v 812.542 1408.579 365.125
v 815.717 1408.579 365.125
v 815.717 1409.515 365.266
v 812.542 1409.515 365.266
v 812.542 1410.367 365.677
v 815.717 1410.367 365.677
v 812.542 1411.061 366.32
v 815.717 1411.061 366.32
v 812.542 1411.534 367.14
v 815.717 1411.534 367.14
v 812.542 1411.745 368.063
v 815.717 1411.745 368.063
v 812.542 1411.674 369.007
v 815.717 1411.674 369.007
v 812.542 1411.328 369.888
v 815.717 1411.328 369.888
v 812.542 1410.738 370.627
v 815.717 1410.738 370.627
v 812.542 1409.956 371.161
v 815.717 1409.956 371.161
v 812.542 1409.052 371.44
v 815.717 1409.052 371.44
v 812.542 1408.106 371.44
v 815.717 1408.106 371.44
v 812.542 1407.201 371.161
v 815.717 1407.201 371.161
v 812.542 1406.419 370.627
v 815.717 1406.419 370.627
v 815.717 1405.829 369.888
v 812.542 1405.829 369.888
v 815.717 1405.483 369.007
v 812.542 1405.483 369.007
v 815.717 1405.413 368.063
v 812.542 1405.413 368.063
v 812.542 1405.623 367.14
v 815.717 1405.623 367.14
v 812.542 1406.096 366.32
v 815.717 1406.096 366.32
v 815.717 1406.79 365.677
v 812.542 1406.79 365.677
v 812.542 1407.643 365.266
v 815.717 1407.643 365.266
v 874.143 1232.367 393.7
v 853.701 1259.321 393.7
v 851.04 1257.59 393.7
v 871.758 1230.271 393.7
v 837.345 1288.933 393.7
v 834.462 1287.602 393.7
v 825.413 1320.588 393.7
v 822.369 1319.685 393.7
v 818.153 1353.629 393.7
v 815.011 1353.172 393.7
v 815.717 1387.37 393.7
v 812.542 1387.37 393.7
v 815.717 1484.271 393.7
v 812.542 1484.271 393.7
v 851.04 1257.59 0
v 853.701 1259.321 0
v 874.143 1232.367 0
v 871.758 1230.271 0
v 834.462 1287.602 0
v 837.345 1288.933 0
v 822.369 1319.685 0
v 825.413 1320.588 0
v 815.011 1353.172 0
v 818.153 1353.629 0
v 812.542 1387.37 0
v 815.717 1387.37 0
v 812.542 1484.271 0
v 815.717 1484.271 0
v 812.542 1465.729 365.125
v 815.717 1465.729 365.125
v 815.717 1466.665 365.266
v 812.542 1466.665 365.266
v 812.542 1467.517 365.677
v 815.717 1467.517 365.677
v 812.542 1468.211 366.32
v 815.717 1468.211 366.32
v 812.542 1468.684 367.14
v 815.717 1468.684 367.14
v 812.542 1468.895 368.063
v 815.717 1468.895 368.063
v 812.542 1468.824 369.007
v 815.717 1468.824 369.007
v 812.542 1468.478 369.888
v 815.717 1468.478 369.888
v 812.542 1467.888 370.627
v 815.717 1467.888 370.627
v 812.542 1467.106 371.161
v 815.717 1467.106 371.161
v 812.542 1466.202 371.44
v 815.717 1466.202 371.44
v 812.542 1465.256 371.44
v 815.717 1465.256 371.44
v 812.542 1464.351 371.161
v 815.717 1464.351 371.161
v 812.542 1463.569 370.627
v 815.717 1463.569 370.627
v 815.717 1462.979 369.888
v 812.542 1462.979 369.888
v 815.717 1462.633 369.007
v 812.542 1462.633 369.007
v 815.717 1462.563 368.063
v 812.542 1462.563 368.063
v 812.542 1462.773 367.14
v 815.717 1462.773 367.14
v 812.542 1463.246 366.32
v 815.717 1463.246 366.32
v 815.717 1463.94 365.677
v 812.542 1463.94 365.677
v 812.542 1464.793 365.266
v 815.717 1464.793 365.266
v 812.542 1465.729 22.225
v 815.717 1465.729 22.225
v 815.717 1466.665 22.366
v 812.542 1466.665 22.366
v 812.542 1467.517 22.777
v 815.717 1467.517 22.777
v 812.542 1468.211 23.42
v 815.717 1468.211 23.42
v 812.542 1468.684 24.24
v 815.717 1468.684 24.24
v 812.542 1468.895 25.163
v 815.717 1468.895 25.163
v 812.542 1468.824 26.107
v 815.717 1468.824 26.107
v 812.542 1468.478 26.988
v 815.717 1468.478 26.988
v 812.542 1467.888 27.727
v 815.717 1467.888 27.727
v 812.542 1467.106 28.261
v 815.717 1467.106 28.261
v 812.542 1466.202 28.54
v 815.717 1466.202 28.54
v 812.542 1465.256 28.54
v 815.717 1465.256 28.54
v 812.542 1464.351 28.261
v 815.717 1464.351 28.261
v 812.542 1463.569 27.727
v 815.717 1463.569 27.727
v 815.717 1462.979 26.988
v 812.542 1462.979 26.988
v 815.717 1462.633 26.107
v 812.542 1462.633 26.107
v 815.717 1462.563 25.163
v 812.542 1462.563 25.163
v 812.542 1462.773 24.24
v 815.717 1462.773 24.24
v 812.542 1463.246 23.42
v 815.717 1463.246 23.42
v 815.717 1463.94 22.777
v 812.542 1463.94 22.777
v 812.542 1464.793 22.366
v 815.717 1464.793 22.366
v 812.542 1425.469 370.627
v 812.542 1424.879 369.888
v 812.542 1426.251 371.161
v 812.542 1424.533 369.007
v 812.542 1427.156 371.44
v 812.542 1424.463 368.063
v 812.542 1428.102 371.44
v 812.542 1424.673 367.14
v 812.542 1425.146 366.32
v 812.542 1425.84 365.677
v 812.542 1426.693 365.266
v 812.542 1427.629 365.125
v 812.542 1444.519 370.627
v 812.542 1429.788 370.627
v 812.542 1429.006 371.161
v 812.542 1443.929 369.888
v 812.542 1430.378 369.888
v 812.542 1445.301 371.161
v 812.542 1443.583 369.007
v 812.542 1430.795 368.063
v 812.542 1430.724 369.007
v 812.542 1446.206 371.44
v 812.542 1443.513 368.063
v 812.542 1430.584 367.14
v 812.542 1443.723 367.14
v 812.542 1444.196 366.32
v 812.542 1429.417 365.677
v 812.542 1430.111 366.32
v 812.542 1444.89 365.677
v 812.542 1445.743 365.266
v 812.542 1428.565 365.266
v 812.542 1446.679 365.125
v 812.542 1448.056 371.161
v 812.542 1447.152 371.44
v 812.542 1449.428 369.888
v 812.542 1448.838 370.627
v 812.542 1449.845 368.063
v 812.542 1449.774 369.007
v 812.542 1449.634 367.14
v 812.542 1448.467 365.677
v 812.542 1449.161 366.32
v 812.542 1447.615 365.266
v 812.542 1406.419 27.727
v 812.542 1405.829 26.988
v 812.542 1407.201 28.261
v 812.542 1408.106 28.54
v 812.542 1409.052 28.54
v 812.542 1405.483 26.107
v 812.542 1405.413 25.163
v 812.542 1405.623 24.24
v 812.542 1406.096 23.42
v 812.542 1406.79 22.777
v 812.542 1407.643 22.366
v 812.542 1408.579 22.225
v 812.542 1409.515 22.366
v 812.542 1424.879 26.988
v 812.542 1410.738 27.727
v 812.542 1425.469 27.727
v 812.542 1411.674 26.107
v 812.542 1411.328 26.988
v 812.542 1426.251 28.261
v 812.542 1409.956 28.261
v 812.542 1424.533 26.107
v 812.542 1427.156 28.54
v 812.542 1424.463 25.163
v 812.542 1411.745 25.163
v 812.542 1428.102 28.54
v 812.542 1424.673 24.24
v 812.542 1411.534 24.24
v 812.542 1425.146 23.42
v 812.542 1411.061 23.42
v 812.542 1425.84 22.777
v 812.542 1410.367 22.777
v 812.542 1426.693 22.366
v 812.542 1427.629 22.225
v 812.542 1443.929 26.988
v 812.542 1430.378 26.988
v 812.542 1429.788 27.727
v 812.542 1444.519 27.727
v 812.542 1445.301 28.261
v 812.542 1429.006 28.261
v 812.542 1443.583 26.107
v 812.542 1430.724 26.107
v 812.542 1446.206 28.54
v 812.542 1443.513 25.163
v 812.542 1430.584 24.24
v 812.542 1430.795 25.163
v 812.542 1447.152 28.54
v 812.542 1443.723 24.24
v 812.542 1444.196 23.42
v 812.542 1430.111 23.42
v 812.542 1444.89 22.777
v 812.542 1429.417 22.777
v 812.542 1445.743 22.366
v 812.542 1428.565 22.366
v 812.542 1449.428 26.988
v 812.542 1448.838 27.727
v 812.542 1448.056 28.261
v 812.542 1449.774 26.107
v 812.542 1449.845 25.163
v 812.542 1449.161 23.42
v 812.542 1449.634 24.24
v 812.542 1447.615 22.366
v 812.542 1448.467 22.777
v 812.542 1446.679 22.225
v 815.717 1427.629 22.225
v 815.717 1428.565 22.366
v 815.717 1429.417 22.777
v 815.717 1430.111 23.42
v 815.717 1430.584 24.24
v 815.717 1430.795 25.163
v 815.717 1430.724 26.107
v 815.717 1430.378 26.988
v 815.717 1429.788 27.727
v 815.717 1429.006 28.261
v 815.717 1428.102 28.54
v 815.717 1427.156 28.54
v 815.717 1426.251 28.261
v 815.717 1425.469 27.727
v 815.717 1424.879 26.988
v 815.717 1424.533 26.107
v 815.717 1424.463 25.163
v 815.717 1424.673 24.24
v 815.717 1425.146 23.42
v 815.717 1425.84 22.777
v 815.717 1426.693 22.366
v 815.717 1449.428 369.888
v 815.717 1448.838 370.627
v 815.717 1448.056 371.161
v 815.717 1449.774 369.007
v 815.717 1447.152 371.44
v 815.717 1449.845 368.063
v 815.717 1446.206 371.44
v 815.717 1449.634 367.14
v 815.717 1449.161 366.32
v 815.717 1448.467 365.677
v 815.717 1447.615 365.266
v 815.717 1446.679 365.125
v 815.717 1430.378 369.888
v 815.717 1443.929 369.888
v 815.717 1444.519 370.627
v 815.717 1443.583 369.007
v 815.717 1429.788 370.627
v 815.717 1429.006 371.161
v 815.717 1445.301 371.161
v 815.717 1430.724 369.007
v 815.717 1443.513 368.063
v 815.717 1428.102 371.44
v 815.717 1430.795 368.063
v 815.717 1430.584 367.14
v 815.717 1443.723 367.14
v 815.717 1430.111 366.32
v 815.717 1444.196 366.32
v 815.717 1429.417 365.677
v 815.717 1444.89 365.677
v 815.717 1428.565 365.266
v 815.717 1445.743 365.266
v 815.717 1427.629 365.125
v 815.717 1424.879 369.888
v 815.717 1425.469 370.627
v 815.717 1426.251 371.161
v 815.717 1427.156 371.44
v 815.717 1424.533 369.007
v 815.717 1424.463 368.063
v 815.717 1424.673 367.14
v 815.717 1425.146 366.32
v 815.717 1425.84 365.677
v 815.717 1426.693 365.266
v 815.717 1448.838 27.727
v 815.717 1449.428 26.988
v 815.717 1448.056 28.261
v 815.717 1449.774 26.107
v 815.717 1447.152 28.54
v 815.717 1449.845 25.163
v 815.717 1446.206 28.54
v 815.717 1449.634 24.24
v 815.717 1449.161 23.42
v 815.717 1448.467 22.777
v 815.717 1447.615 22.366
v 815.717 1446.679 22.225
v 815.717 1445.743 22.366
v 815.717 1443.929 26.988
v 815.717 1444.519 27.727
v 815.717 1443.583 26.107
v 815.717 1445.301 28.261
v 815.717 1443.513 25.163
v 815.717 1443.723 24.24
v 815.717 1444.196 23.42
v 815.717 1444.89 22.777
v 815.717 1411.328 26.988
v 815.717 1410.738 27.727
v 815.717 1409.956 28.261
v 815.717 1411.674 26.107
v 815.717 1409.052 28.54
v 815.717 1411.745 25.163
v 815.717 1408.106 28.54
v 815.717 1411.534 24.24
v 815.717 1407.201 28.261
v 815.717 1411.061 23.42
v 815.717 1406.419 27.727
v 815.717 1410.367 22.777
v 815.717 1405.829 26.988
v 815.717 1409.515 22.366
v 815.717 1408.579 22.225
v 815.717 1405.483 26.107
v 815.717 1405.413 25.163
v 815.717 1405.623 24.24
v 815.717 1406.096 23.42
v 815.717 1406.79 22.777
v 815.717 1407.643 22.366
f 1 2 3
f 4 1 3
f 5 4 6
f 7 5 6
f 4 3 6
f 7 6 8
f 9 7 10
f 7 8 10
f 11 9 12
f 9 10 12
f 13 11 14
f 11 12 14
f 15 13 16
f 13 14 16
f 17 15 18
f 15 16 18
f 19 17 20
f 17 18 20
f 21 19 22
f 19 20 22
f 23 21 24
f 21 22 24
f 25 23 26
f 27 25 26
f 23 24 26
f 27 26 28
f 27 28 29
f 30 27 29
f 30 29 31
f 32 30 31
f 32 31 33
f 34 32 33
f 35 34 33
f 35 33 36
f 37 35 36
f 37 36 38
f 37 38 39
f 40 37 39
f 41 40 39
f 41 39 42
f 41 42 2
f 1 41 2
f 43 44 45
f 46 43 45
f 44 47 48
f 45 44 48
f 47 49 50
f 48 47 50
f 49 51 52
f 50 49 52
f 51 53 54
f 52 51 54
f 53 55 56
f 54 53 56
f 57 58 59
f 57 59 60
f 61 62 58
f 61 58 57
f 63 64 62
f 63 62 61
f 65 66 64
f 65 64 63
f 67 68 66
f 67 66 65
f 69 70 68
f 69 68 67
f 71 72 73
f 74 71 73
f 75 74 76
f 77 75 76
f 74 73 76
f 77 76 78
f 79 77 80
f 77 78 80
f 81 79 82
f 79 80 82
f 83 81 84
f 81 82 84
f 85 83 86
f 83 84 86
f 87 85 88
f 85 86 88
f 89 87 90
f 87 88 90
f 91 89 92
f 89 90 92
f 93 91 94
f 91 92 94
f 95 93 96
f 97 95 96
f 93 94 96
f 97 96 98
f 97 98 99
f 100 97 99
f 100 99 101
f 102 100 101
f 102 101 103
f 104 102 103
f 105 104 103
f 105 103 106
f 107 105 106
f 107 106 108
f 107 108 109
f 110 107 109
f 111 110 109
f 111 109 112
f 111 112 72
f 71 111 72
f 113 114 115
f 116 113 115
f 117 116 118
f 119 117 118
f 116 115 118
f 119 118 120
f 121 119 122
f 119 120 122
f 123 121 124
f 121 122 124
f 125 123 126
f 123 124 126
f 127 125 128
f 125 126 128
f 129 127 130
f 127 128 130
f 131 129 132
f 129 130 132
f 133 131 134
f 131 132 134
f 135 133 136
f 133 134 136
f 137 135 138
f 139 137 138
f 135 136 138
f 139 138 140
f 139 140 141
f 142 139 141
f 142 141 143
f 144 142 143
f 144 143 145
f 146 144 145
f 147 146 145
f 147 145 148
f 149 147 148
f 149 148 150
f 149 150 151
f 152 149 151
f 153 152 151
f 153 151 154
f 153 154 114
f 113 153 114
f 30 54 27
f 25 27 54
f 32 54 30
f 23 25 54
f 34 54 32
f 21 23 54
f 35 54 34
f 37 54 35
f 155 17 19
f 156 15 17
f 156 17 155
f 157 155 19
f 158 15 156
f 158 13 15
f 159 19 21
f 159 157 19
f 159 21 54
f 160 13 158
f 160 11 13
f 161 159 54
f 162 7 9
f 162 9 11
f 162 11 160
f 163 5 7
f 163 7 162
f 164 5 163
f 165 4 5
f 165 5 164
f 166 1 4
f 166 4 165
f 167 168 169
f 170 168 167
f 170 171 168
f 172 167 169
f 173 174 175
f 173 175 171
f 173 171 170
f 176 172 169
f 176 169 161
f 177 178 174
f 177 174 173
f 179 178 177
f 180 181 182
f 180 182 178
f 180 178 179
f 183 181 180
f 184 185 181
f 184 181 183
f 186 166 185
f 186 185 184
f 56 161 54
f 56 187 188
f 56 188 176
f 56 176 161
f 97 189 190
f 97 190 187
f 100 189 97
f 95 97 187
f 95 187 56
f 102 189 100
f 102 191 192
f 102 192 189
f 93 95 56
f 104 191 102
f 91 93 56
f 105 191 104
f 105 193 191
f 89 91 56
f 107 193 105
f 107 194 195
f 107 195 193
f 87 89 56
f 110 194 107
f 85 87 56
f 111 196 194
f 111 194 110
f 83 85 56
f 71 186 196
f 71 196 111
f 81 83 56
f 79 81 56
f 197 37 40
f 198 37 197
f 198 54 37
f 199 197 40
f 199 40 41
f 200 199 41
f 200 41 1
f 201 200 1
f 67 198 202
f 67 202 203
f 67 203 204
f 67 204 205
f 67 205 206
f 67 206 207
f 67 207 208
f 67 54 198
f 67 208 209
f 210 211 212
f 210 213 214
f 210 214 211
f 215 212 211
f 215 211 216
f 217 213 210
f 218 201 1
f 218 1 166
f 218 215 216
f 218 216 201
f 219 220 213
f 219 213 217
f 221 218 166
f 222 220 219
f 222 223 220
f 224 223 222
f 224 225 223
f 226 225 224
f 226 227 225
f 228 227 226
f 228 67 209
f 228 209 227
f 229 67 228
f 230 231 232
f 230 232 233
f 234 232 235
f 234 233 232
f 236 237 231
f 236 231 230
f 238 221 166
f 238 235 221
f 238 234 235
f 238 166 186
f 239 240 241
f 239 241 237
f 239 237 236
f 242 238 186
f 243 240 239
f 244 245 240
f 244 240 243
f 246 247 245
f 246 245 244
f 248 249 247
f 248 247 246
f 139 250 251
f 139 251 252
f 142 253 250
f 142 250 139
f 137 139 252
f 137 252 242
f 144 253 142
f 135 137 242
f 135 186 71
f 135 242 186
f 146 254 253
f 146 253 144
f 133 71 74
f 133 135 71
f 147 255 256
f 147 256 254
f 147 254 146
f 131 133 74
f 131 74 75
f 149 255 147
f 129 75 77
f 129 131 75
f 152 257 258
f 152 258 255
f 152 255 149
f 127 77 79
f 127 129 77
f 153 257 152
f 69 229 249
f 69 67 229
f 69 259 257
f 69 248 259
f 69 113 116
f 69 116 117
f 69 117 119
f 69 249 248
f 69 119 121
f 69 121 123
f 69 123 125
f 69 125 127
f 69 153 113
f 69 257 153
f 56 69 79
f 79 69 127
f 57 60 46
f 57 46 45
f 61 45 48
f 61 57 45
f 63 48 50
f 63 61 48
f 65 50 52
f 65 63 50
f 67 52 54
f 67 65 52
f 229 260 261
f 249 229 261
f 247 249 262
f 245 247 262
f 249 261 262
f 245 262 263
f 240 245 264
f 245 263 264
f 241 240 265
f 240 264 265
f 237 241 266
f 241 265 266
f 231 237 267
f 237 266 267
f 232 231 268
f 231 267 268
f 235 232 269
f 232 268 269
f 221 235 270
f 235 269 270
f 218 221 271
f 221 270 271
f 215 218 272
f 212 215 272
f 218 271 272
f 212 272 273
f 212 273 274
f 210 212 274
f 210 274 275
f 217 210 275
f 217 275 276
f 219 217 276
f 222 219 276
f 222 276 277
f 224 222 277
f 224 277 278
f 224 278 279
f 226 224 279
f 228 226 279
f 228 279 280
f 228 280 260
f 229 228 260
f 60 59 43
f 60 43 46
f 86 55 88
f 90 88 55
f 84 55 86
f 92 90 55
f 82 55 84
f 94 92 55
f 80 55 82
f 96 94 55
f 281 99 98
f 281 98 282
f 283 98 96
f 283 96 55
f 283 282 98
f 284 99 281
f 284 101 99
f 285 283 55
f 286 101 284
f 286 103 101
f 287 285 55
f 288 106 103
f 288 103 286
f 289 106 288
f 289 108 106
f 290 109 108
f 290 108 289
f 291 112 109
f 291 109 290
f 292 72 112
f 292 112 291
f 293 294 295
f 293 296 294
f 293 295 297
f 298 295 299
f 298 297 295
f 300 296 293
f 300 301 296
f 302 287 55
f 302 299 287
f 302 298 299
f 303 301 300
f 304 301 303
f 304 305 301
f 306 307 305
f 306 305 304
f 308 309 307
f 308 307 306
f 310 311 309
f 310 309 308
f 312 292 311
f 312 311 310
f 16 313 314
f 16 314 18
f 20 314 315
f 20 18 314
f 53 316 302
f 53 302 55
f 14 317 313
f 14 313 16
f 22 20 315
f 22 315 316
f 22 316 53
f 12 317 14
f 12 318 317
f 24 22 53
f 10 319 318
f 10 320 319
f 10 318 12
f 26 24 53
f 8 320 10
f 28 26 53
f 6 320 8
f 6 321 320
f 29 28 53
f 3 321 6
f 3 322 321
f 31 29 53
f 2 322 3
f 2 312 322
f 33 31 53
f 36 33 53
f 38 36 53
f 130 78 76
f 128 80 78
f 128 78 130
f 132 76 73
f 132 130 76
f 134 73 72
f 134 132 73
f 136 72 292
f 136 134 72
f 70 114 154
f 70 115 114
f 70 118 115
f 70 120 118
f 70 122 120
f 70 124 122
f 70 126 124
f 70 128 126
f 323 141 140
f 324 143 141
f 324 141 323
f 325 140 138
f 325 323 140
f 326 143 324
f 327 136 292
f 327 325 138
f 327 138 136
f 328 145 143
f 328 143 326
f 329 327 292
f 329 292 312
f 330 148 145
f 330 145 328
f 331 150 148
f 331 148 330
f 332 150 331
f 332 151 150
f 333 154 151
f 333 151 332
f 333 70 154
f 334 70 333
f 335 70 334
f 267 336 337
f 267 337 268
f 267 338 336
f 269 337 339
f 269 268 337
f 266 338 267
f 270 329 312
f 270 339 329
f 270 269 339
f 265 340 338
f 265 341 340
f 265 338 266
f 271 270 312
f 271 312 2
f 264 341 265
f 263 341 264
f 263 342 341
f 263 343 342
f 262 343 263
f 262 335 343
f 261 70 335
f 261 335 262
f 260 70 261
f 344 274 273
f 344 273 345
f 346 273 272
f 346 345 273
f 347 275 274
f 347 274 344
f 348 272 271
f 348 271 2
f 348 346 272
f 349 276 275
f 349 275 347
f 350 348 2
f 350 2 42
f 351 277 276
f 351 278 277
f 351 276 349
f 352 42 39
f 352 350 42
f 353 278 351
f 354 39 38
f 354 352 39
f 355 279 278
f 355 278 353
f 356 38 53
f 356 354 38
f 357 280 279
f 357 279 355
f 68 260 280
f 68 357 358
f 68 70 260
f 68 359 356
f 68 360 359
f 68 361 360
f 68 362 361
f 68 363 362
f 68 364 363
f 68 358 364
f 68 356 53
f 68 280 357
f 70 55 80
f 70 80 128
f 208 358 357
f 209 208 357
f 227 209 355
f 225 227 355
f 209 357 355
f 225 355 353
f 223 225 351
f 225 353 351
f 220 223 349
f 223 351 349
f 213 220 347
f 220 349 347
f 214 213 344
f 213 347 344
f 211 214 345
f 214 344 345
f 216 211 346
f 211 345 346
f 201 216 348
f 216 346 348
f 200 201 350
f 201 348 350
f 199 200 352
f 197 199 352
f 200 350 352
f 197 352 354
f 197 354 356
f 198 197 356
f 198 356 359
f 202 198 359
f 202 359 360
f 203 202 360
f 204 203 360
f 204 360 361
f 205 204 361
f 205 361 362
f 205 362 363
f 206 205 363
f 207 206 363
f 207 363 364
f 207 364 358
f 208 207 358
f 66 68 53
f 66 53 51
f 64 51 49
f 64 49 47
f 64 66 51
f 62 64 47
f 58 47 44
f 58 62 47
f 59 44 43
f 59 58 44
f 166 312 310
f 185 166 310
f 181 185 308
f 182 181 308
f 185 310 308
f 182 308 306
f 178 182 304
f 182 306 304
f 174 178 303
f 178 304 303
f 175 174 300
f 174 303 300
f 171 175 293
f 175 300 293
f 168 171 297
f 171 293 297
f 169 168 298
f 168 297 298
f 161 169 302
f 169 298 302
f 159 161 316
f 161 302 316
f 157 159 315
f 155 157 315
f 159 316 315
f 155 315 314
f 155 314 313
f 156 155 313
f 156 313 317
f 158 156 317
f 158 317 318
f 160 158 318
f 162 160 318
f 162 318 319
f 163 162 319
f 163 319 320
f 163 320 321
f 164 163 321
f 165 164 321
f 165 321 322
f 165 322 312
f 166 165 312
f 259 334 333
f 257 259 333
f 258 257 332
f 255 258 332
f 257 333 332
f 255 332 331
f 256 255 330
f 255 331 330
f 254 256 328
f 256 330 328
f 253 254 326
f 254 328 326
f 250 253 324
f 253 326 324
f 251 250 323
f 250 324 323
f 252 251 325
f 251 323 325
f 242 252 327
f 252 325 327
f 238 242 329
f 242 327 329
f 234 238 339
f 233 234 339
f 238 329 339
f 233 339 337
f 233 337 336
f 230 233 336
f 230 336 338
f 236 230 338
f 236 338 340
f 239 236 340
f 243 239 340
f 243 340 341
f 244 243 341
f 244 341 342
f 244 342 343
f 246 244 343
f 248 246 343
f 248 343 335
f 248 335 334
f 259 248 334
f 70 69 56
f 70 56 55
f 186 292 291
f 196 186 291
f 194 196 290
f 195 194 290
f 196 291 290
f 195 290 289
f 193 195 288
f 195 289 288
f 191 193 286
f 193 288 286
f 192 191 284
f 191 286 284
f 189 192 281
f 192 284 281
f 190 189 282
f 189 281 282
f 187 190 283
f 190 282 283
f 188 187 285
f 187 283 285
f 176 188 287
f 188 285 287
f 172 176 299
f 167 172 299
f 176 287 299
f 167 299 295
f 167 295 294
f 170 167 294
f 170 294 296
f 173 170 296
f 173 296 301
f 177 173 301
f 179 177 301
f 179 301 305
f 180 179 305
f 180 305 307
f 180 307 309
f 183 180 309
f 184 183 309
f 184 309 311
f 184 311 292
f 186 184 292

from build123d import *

# Parameters (mm, degrees)
BOSS_EXTRUDE1_DEPTH = 393.7
SKETCH2_R           = 3.175
CUT_EXTRUDE1_DEPTH  = 1537.708536769


with BuildPart() as part:
    # Sketch1 → Boss-Extrude1 (new body)
    with BuildSketch(Plane.XY):
        with BuildLine():
            Line((812.541689005, 1387.369803868), (812.541689005, 1484.270803868))
            Line((812.541689005, 1484.270803868), (815.716689005, 1484.270803868))
            Line((815.716689005, 1484.270803868), (815.716689005, 1387.369803868))
            ThreePointArc((815.716689005, 1387.369803868), (830.808178648, 1304.545262303), (874.142862637, 1232.366574946))
            Line((874.142862637, 1232.366574946), (871.757832535, 1230.270803868))
            ThreePointArc((871.757832535, 1230.270803868), (827.837227995, 1303.425406414), (812.541689005, 1387.369803868))
        make_face()
    extrude(amount=BOSS_EXTRUDE1_DEPTH)

    # Sketch2 → Cut-Extrude1 (cut, through all)
    with BuildSketch(Plane(origin=(815.716689005, 0, 0), x_dir=(0, 0, -1), z_dir=(1, 0, 0))):
        with Locations((-368.3, 1446.678803868)):
            Circle(SKETCH2_R)
        with Locations((-368.3, 1427.628803868)):
            Circle(SKETCH2_R)
        with Locations((-368.3, 1408.578803868)):
            Circle(SKETCH2_R)
        with Locations((-25.4, 1465.728803868)):
            Circle(SKETCH2_R)
        with Locations((-25.4, 1446.678803868)):
            Circle(SKETCH2_R)
        with Locations((-25.4, 1427.628803868)):
            Circle(SKETCH2_R)
        with Locations((-368.3, 1465.728803868)):
            Circle(SKETCH2_R)
        with Locations((-25.4, 1408.578803868)):
            Circle(SKETCH2_R)
    extrude(amount=-CUT_EXTRUDE1_DEPTH, mode=Mode.SUBTRACT)


solid = part.part
